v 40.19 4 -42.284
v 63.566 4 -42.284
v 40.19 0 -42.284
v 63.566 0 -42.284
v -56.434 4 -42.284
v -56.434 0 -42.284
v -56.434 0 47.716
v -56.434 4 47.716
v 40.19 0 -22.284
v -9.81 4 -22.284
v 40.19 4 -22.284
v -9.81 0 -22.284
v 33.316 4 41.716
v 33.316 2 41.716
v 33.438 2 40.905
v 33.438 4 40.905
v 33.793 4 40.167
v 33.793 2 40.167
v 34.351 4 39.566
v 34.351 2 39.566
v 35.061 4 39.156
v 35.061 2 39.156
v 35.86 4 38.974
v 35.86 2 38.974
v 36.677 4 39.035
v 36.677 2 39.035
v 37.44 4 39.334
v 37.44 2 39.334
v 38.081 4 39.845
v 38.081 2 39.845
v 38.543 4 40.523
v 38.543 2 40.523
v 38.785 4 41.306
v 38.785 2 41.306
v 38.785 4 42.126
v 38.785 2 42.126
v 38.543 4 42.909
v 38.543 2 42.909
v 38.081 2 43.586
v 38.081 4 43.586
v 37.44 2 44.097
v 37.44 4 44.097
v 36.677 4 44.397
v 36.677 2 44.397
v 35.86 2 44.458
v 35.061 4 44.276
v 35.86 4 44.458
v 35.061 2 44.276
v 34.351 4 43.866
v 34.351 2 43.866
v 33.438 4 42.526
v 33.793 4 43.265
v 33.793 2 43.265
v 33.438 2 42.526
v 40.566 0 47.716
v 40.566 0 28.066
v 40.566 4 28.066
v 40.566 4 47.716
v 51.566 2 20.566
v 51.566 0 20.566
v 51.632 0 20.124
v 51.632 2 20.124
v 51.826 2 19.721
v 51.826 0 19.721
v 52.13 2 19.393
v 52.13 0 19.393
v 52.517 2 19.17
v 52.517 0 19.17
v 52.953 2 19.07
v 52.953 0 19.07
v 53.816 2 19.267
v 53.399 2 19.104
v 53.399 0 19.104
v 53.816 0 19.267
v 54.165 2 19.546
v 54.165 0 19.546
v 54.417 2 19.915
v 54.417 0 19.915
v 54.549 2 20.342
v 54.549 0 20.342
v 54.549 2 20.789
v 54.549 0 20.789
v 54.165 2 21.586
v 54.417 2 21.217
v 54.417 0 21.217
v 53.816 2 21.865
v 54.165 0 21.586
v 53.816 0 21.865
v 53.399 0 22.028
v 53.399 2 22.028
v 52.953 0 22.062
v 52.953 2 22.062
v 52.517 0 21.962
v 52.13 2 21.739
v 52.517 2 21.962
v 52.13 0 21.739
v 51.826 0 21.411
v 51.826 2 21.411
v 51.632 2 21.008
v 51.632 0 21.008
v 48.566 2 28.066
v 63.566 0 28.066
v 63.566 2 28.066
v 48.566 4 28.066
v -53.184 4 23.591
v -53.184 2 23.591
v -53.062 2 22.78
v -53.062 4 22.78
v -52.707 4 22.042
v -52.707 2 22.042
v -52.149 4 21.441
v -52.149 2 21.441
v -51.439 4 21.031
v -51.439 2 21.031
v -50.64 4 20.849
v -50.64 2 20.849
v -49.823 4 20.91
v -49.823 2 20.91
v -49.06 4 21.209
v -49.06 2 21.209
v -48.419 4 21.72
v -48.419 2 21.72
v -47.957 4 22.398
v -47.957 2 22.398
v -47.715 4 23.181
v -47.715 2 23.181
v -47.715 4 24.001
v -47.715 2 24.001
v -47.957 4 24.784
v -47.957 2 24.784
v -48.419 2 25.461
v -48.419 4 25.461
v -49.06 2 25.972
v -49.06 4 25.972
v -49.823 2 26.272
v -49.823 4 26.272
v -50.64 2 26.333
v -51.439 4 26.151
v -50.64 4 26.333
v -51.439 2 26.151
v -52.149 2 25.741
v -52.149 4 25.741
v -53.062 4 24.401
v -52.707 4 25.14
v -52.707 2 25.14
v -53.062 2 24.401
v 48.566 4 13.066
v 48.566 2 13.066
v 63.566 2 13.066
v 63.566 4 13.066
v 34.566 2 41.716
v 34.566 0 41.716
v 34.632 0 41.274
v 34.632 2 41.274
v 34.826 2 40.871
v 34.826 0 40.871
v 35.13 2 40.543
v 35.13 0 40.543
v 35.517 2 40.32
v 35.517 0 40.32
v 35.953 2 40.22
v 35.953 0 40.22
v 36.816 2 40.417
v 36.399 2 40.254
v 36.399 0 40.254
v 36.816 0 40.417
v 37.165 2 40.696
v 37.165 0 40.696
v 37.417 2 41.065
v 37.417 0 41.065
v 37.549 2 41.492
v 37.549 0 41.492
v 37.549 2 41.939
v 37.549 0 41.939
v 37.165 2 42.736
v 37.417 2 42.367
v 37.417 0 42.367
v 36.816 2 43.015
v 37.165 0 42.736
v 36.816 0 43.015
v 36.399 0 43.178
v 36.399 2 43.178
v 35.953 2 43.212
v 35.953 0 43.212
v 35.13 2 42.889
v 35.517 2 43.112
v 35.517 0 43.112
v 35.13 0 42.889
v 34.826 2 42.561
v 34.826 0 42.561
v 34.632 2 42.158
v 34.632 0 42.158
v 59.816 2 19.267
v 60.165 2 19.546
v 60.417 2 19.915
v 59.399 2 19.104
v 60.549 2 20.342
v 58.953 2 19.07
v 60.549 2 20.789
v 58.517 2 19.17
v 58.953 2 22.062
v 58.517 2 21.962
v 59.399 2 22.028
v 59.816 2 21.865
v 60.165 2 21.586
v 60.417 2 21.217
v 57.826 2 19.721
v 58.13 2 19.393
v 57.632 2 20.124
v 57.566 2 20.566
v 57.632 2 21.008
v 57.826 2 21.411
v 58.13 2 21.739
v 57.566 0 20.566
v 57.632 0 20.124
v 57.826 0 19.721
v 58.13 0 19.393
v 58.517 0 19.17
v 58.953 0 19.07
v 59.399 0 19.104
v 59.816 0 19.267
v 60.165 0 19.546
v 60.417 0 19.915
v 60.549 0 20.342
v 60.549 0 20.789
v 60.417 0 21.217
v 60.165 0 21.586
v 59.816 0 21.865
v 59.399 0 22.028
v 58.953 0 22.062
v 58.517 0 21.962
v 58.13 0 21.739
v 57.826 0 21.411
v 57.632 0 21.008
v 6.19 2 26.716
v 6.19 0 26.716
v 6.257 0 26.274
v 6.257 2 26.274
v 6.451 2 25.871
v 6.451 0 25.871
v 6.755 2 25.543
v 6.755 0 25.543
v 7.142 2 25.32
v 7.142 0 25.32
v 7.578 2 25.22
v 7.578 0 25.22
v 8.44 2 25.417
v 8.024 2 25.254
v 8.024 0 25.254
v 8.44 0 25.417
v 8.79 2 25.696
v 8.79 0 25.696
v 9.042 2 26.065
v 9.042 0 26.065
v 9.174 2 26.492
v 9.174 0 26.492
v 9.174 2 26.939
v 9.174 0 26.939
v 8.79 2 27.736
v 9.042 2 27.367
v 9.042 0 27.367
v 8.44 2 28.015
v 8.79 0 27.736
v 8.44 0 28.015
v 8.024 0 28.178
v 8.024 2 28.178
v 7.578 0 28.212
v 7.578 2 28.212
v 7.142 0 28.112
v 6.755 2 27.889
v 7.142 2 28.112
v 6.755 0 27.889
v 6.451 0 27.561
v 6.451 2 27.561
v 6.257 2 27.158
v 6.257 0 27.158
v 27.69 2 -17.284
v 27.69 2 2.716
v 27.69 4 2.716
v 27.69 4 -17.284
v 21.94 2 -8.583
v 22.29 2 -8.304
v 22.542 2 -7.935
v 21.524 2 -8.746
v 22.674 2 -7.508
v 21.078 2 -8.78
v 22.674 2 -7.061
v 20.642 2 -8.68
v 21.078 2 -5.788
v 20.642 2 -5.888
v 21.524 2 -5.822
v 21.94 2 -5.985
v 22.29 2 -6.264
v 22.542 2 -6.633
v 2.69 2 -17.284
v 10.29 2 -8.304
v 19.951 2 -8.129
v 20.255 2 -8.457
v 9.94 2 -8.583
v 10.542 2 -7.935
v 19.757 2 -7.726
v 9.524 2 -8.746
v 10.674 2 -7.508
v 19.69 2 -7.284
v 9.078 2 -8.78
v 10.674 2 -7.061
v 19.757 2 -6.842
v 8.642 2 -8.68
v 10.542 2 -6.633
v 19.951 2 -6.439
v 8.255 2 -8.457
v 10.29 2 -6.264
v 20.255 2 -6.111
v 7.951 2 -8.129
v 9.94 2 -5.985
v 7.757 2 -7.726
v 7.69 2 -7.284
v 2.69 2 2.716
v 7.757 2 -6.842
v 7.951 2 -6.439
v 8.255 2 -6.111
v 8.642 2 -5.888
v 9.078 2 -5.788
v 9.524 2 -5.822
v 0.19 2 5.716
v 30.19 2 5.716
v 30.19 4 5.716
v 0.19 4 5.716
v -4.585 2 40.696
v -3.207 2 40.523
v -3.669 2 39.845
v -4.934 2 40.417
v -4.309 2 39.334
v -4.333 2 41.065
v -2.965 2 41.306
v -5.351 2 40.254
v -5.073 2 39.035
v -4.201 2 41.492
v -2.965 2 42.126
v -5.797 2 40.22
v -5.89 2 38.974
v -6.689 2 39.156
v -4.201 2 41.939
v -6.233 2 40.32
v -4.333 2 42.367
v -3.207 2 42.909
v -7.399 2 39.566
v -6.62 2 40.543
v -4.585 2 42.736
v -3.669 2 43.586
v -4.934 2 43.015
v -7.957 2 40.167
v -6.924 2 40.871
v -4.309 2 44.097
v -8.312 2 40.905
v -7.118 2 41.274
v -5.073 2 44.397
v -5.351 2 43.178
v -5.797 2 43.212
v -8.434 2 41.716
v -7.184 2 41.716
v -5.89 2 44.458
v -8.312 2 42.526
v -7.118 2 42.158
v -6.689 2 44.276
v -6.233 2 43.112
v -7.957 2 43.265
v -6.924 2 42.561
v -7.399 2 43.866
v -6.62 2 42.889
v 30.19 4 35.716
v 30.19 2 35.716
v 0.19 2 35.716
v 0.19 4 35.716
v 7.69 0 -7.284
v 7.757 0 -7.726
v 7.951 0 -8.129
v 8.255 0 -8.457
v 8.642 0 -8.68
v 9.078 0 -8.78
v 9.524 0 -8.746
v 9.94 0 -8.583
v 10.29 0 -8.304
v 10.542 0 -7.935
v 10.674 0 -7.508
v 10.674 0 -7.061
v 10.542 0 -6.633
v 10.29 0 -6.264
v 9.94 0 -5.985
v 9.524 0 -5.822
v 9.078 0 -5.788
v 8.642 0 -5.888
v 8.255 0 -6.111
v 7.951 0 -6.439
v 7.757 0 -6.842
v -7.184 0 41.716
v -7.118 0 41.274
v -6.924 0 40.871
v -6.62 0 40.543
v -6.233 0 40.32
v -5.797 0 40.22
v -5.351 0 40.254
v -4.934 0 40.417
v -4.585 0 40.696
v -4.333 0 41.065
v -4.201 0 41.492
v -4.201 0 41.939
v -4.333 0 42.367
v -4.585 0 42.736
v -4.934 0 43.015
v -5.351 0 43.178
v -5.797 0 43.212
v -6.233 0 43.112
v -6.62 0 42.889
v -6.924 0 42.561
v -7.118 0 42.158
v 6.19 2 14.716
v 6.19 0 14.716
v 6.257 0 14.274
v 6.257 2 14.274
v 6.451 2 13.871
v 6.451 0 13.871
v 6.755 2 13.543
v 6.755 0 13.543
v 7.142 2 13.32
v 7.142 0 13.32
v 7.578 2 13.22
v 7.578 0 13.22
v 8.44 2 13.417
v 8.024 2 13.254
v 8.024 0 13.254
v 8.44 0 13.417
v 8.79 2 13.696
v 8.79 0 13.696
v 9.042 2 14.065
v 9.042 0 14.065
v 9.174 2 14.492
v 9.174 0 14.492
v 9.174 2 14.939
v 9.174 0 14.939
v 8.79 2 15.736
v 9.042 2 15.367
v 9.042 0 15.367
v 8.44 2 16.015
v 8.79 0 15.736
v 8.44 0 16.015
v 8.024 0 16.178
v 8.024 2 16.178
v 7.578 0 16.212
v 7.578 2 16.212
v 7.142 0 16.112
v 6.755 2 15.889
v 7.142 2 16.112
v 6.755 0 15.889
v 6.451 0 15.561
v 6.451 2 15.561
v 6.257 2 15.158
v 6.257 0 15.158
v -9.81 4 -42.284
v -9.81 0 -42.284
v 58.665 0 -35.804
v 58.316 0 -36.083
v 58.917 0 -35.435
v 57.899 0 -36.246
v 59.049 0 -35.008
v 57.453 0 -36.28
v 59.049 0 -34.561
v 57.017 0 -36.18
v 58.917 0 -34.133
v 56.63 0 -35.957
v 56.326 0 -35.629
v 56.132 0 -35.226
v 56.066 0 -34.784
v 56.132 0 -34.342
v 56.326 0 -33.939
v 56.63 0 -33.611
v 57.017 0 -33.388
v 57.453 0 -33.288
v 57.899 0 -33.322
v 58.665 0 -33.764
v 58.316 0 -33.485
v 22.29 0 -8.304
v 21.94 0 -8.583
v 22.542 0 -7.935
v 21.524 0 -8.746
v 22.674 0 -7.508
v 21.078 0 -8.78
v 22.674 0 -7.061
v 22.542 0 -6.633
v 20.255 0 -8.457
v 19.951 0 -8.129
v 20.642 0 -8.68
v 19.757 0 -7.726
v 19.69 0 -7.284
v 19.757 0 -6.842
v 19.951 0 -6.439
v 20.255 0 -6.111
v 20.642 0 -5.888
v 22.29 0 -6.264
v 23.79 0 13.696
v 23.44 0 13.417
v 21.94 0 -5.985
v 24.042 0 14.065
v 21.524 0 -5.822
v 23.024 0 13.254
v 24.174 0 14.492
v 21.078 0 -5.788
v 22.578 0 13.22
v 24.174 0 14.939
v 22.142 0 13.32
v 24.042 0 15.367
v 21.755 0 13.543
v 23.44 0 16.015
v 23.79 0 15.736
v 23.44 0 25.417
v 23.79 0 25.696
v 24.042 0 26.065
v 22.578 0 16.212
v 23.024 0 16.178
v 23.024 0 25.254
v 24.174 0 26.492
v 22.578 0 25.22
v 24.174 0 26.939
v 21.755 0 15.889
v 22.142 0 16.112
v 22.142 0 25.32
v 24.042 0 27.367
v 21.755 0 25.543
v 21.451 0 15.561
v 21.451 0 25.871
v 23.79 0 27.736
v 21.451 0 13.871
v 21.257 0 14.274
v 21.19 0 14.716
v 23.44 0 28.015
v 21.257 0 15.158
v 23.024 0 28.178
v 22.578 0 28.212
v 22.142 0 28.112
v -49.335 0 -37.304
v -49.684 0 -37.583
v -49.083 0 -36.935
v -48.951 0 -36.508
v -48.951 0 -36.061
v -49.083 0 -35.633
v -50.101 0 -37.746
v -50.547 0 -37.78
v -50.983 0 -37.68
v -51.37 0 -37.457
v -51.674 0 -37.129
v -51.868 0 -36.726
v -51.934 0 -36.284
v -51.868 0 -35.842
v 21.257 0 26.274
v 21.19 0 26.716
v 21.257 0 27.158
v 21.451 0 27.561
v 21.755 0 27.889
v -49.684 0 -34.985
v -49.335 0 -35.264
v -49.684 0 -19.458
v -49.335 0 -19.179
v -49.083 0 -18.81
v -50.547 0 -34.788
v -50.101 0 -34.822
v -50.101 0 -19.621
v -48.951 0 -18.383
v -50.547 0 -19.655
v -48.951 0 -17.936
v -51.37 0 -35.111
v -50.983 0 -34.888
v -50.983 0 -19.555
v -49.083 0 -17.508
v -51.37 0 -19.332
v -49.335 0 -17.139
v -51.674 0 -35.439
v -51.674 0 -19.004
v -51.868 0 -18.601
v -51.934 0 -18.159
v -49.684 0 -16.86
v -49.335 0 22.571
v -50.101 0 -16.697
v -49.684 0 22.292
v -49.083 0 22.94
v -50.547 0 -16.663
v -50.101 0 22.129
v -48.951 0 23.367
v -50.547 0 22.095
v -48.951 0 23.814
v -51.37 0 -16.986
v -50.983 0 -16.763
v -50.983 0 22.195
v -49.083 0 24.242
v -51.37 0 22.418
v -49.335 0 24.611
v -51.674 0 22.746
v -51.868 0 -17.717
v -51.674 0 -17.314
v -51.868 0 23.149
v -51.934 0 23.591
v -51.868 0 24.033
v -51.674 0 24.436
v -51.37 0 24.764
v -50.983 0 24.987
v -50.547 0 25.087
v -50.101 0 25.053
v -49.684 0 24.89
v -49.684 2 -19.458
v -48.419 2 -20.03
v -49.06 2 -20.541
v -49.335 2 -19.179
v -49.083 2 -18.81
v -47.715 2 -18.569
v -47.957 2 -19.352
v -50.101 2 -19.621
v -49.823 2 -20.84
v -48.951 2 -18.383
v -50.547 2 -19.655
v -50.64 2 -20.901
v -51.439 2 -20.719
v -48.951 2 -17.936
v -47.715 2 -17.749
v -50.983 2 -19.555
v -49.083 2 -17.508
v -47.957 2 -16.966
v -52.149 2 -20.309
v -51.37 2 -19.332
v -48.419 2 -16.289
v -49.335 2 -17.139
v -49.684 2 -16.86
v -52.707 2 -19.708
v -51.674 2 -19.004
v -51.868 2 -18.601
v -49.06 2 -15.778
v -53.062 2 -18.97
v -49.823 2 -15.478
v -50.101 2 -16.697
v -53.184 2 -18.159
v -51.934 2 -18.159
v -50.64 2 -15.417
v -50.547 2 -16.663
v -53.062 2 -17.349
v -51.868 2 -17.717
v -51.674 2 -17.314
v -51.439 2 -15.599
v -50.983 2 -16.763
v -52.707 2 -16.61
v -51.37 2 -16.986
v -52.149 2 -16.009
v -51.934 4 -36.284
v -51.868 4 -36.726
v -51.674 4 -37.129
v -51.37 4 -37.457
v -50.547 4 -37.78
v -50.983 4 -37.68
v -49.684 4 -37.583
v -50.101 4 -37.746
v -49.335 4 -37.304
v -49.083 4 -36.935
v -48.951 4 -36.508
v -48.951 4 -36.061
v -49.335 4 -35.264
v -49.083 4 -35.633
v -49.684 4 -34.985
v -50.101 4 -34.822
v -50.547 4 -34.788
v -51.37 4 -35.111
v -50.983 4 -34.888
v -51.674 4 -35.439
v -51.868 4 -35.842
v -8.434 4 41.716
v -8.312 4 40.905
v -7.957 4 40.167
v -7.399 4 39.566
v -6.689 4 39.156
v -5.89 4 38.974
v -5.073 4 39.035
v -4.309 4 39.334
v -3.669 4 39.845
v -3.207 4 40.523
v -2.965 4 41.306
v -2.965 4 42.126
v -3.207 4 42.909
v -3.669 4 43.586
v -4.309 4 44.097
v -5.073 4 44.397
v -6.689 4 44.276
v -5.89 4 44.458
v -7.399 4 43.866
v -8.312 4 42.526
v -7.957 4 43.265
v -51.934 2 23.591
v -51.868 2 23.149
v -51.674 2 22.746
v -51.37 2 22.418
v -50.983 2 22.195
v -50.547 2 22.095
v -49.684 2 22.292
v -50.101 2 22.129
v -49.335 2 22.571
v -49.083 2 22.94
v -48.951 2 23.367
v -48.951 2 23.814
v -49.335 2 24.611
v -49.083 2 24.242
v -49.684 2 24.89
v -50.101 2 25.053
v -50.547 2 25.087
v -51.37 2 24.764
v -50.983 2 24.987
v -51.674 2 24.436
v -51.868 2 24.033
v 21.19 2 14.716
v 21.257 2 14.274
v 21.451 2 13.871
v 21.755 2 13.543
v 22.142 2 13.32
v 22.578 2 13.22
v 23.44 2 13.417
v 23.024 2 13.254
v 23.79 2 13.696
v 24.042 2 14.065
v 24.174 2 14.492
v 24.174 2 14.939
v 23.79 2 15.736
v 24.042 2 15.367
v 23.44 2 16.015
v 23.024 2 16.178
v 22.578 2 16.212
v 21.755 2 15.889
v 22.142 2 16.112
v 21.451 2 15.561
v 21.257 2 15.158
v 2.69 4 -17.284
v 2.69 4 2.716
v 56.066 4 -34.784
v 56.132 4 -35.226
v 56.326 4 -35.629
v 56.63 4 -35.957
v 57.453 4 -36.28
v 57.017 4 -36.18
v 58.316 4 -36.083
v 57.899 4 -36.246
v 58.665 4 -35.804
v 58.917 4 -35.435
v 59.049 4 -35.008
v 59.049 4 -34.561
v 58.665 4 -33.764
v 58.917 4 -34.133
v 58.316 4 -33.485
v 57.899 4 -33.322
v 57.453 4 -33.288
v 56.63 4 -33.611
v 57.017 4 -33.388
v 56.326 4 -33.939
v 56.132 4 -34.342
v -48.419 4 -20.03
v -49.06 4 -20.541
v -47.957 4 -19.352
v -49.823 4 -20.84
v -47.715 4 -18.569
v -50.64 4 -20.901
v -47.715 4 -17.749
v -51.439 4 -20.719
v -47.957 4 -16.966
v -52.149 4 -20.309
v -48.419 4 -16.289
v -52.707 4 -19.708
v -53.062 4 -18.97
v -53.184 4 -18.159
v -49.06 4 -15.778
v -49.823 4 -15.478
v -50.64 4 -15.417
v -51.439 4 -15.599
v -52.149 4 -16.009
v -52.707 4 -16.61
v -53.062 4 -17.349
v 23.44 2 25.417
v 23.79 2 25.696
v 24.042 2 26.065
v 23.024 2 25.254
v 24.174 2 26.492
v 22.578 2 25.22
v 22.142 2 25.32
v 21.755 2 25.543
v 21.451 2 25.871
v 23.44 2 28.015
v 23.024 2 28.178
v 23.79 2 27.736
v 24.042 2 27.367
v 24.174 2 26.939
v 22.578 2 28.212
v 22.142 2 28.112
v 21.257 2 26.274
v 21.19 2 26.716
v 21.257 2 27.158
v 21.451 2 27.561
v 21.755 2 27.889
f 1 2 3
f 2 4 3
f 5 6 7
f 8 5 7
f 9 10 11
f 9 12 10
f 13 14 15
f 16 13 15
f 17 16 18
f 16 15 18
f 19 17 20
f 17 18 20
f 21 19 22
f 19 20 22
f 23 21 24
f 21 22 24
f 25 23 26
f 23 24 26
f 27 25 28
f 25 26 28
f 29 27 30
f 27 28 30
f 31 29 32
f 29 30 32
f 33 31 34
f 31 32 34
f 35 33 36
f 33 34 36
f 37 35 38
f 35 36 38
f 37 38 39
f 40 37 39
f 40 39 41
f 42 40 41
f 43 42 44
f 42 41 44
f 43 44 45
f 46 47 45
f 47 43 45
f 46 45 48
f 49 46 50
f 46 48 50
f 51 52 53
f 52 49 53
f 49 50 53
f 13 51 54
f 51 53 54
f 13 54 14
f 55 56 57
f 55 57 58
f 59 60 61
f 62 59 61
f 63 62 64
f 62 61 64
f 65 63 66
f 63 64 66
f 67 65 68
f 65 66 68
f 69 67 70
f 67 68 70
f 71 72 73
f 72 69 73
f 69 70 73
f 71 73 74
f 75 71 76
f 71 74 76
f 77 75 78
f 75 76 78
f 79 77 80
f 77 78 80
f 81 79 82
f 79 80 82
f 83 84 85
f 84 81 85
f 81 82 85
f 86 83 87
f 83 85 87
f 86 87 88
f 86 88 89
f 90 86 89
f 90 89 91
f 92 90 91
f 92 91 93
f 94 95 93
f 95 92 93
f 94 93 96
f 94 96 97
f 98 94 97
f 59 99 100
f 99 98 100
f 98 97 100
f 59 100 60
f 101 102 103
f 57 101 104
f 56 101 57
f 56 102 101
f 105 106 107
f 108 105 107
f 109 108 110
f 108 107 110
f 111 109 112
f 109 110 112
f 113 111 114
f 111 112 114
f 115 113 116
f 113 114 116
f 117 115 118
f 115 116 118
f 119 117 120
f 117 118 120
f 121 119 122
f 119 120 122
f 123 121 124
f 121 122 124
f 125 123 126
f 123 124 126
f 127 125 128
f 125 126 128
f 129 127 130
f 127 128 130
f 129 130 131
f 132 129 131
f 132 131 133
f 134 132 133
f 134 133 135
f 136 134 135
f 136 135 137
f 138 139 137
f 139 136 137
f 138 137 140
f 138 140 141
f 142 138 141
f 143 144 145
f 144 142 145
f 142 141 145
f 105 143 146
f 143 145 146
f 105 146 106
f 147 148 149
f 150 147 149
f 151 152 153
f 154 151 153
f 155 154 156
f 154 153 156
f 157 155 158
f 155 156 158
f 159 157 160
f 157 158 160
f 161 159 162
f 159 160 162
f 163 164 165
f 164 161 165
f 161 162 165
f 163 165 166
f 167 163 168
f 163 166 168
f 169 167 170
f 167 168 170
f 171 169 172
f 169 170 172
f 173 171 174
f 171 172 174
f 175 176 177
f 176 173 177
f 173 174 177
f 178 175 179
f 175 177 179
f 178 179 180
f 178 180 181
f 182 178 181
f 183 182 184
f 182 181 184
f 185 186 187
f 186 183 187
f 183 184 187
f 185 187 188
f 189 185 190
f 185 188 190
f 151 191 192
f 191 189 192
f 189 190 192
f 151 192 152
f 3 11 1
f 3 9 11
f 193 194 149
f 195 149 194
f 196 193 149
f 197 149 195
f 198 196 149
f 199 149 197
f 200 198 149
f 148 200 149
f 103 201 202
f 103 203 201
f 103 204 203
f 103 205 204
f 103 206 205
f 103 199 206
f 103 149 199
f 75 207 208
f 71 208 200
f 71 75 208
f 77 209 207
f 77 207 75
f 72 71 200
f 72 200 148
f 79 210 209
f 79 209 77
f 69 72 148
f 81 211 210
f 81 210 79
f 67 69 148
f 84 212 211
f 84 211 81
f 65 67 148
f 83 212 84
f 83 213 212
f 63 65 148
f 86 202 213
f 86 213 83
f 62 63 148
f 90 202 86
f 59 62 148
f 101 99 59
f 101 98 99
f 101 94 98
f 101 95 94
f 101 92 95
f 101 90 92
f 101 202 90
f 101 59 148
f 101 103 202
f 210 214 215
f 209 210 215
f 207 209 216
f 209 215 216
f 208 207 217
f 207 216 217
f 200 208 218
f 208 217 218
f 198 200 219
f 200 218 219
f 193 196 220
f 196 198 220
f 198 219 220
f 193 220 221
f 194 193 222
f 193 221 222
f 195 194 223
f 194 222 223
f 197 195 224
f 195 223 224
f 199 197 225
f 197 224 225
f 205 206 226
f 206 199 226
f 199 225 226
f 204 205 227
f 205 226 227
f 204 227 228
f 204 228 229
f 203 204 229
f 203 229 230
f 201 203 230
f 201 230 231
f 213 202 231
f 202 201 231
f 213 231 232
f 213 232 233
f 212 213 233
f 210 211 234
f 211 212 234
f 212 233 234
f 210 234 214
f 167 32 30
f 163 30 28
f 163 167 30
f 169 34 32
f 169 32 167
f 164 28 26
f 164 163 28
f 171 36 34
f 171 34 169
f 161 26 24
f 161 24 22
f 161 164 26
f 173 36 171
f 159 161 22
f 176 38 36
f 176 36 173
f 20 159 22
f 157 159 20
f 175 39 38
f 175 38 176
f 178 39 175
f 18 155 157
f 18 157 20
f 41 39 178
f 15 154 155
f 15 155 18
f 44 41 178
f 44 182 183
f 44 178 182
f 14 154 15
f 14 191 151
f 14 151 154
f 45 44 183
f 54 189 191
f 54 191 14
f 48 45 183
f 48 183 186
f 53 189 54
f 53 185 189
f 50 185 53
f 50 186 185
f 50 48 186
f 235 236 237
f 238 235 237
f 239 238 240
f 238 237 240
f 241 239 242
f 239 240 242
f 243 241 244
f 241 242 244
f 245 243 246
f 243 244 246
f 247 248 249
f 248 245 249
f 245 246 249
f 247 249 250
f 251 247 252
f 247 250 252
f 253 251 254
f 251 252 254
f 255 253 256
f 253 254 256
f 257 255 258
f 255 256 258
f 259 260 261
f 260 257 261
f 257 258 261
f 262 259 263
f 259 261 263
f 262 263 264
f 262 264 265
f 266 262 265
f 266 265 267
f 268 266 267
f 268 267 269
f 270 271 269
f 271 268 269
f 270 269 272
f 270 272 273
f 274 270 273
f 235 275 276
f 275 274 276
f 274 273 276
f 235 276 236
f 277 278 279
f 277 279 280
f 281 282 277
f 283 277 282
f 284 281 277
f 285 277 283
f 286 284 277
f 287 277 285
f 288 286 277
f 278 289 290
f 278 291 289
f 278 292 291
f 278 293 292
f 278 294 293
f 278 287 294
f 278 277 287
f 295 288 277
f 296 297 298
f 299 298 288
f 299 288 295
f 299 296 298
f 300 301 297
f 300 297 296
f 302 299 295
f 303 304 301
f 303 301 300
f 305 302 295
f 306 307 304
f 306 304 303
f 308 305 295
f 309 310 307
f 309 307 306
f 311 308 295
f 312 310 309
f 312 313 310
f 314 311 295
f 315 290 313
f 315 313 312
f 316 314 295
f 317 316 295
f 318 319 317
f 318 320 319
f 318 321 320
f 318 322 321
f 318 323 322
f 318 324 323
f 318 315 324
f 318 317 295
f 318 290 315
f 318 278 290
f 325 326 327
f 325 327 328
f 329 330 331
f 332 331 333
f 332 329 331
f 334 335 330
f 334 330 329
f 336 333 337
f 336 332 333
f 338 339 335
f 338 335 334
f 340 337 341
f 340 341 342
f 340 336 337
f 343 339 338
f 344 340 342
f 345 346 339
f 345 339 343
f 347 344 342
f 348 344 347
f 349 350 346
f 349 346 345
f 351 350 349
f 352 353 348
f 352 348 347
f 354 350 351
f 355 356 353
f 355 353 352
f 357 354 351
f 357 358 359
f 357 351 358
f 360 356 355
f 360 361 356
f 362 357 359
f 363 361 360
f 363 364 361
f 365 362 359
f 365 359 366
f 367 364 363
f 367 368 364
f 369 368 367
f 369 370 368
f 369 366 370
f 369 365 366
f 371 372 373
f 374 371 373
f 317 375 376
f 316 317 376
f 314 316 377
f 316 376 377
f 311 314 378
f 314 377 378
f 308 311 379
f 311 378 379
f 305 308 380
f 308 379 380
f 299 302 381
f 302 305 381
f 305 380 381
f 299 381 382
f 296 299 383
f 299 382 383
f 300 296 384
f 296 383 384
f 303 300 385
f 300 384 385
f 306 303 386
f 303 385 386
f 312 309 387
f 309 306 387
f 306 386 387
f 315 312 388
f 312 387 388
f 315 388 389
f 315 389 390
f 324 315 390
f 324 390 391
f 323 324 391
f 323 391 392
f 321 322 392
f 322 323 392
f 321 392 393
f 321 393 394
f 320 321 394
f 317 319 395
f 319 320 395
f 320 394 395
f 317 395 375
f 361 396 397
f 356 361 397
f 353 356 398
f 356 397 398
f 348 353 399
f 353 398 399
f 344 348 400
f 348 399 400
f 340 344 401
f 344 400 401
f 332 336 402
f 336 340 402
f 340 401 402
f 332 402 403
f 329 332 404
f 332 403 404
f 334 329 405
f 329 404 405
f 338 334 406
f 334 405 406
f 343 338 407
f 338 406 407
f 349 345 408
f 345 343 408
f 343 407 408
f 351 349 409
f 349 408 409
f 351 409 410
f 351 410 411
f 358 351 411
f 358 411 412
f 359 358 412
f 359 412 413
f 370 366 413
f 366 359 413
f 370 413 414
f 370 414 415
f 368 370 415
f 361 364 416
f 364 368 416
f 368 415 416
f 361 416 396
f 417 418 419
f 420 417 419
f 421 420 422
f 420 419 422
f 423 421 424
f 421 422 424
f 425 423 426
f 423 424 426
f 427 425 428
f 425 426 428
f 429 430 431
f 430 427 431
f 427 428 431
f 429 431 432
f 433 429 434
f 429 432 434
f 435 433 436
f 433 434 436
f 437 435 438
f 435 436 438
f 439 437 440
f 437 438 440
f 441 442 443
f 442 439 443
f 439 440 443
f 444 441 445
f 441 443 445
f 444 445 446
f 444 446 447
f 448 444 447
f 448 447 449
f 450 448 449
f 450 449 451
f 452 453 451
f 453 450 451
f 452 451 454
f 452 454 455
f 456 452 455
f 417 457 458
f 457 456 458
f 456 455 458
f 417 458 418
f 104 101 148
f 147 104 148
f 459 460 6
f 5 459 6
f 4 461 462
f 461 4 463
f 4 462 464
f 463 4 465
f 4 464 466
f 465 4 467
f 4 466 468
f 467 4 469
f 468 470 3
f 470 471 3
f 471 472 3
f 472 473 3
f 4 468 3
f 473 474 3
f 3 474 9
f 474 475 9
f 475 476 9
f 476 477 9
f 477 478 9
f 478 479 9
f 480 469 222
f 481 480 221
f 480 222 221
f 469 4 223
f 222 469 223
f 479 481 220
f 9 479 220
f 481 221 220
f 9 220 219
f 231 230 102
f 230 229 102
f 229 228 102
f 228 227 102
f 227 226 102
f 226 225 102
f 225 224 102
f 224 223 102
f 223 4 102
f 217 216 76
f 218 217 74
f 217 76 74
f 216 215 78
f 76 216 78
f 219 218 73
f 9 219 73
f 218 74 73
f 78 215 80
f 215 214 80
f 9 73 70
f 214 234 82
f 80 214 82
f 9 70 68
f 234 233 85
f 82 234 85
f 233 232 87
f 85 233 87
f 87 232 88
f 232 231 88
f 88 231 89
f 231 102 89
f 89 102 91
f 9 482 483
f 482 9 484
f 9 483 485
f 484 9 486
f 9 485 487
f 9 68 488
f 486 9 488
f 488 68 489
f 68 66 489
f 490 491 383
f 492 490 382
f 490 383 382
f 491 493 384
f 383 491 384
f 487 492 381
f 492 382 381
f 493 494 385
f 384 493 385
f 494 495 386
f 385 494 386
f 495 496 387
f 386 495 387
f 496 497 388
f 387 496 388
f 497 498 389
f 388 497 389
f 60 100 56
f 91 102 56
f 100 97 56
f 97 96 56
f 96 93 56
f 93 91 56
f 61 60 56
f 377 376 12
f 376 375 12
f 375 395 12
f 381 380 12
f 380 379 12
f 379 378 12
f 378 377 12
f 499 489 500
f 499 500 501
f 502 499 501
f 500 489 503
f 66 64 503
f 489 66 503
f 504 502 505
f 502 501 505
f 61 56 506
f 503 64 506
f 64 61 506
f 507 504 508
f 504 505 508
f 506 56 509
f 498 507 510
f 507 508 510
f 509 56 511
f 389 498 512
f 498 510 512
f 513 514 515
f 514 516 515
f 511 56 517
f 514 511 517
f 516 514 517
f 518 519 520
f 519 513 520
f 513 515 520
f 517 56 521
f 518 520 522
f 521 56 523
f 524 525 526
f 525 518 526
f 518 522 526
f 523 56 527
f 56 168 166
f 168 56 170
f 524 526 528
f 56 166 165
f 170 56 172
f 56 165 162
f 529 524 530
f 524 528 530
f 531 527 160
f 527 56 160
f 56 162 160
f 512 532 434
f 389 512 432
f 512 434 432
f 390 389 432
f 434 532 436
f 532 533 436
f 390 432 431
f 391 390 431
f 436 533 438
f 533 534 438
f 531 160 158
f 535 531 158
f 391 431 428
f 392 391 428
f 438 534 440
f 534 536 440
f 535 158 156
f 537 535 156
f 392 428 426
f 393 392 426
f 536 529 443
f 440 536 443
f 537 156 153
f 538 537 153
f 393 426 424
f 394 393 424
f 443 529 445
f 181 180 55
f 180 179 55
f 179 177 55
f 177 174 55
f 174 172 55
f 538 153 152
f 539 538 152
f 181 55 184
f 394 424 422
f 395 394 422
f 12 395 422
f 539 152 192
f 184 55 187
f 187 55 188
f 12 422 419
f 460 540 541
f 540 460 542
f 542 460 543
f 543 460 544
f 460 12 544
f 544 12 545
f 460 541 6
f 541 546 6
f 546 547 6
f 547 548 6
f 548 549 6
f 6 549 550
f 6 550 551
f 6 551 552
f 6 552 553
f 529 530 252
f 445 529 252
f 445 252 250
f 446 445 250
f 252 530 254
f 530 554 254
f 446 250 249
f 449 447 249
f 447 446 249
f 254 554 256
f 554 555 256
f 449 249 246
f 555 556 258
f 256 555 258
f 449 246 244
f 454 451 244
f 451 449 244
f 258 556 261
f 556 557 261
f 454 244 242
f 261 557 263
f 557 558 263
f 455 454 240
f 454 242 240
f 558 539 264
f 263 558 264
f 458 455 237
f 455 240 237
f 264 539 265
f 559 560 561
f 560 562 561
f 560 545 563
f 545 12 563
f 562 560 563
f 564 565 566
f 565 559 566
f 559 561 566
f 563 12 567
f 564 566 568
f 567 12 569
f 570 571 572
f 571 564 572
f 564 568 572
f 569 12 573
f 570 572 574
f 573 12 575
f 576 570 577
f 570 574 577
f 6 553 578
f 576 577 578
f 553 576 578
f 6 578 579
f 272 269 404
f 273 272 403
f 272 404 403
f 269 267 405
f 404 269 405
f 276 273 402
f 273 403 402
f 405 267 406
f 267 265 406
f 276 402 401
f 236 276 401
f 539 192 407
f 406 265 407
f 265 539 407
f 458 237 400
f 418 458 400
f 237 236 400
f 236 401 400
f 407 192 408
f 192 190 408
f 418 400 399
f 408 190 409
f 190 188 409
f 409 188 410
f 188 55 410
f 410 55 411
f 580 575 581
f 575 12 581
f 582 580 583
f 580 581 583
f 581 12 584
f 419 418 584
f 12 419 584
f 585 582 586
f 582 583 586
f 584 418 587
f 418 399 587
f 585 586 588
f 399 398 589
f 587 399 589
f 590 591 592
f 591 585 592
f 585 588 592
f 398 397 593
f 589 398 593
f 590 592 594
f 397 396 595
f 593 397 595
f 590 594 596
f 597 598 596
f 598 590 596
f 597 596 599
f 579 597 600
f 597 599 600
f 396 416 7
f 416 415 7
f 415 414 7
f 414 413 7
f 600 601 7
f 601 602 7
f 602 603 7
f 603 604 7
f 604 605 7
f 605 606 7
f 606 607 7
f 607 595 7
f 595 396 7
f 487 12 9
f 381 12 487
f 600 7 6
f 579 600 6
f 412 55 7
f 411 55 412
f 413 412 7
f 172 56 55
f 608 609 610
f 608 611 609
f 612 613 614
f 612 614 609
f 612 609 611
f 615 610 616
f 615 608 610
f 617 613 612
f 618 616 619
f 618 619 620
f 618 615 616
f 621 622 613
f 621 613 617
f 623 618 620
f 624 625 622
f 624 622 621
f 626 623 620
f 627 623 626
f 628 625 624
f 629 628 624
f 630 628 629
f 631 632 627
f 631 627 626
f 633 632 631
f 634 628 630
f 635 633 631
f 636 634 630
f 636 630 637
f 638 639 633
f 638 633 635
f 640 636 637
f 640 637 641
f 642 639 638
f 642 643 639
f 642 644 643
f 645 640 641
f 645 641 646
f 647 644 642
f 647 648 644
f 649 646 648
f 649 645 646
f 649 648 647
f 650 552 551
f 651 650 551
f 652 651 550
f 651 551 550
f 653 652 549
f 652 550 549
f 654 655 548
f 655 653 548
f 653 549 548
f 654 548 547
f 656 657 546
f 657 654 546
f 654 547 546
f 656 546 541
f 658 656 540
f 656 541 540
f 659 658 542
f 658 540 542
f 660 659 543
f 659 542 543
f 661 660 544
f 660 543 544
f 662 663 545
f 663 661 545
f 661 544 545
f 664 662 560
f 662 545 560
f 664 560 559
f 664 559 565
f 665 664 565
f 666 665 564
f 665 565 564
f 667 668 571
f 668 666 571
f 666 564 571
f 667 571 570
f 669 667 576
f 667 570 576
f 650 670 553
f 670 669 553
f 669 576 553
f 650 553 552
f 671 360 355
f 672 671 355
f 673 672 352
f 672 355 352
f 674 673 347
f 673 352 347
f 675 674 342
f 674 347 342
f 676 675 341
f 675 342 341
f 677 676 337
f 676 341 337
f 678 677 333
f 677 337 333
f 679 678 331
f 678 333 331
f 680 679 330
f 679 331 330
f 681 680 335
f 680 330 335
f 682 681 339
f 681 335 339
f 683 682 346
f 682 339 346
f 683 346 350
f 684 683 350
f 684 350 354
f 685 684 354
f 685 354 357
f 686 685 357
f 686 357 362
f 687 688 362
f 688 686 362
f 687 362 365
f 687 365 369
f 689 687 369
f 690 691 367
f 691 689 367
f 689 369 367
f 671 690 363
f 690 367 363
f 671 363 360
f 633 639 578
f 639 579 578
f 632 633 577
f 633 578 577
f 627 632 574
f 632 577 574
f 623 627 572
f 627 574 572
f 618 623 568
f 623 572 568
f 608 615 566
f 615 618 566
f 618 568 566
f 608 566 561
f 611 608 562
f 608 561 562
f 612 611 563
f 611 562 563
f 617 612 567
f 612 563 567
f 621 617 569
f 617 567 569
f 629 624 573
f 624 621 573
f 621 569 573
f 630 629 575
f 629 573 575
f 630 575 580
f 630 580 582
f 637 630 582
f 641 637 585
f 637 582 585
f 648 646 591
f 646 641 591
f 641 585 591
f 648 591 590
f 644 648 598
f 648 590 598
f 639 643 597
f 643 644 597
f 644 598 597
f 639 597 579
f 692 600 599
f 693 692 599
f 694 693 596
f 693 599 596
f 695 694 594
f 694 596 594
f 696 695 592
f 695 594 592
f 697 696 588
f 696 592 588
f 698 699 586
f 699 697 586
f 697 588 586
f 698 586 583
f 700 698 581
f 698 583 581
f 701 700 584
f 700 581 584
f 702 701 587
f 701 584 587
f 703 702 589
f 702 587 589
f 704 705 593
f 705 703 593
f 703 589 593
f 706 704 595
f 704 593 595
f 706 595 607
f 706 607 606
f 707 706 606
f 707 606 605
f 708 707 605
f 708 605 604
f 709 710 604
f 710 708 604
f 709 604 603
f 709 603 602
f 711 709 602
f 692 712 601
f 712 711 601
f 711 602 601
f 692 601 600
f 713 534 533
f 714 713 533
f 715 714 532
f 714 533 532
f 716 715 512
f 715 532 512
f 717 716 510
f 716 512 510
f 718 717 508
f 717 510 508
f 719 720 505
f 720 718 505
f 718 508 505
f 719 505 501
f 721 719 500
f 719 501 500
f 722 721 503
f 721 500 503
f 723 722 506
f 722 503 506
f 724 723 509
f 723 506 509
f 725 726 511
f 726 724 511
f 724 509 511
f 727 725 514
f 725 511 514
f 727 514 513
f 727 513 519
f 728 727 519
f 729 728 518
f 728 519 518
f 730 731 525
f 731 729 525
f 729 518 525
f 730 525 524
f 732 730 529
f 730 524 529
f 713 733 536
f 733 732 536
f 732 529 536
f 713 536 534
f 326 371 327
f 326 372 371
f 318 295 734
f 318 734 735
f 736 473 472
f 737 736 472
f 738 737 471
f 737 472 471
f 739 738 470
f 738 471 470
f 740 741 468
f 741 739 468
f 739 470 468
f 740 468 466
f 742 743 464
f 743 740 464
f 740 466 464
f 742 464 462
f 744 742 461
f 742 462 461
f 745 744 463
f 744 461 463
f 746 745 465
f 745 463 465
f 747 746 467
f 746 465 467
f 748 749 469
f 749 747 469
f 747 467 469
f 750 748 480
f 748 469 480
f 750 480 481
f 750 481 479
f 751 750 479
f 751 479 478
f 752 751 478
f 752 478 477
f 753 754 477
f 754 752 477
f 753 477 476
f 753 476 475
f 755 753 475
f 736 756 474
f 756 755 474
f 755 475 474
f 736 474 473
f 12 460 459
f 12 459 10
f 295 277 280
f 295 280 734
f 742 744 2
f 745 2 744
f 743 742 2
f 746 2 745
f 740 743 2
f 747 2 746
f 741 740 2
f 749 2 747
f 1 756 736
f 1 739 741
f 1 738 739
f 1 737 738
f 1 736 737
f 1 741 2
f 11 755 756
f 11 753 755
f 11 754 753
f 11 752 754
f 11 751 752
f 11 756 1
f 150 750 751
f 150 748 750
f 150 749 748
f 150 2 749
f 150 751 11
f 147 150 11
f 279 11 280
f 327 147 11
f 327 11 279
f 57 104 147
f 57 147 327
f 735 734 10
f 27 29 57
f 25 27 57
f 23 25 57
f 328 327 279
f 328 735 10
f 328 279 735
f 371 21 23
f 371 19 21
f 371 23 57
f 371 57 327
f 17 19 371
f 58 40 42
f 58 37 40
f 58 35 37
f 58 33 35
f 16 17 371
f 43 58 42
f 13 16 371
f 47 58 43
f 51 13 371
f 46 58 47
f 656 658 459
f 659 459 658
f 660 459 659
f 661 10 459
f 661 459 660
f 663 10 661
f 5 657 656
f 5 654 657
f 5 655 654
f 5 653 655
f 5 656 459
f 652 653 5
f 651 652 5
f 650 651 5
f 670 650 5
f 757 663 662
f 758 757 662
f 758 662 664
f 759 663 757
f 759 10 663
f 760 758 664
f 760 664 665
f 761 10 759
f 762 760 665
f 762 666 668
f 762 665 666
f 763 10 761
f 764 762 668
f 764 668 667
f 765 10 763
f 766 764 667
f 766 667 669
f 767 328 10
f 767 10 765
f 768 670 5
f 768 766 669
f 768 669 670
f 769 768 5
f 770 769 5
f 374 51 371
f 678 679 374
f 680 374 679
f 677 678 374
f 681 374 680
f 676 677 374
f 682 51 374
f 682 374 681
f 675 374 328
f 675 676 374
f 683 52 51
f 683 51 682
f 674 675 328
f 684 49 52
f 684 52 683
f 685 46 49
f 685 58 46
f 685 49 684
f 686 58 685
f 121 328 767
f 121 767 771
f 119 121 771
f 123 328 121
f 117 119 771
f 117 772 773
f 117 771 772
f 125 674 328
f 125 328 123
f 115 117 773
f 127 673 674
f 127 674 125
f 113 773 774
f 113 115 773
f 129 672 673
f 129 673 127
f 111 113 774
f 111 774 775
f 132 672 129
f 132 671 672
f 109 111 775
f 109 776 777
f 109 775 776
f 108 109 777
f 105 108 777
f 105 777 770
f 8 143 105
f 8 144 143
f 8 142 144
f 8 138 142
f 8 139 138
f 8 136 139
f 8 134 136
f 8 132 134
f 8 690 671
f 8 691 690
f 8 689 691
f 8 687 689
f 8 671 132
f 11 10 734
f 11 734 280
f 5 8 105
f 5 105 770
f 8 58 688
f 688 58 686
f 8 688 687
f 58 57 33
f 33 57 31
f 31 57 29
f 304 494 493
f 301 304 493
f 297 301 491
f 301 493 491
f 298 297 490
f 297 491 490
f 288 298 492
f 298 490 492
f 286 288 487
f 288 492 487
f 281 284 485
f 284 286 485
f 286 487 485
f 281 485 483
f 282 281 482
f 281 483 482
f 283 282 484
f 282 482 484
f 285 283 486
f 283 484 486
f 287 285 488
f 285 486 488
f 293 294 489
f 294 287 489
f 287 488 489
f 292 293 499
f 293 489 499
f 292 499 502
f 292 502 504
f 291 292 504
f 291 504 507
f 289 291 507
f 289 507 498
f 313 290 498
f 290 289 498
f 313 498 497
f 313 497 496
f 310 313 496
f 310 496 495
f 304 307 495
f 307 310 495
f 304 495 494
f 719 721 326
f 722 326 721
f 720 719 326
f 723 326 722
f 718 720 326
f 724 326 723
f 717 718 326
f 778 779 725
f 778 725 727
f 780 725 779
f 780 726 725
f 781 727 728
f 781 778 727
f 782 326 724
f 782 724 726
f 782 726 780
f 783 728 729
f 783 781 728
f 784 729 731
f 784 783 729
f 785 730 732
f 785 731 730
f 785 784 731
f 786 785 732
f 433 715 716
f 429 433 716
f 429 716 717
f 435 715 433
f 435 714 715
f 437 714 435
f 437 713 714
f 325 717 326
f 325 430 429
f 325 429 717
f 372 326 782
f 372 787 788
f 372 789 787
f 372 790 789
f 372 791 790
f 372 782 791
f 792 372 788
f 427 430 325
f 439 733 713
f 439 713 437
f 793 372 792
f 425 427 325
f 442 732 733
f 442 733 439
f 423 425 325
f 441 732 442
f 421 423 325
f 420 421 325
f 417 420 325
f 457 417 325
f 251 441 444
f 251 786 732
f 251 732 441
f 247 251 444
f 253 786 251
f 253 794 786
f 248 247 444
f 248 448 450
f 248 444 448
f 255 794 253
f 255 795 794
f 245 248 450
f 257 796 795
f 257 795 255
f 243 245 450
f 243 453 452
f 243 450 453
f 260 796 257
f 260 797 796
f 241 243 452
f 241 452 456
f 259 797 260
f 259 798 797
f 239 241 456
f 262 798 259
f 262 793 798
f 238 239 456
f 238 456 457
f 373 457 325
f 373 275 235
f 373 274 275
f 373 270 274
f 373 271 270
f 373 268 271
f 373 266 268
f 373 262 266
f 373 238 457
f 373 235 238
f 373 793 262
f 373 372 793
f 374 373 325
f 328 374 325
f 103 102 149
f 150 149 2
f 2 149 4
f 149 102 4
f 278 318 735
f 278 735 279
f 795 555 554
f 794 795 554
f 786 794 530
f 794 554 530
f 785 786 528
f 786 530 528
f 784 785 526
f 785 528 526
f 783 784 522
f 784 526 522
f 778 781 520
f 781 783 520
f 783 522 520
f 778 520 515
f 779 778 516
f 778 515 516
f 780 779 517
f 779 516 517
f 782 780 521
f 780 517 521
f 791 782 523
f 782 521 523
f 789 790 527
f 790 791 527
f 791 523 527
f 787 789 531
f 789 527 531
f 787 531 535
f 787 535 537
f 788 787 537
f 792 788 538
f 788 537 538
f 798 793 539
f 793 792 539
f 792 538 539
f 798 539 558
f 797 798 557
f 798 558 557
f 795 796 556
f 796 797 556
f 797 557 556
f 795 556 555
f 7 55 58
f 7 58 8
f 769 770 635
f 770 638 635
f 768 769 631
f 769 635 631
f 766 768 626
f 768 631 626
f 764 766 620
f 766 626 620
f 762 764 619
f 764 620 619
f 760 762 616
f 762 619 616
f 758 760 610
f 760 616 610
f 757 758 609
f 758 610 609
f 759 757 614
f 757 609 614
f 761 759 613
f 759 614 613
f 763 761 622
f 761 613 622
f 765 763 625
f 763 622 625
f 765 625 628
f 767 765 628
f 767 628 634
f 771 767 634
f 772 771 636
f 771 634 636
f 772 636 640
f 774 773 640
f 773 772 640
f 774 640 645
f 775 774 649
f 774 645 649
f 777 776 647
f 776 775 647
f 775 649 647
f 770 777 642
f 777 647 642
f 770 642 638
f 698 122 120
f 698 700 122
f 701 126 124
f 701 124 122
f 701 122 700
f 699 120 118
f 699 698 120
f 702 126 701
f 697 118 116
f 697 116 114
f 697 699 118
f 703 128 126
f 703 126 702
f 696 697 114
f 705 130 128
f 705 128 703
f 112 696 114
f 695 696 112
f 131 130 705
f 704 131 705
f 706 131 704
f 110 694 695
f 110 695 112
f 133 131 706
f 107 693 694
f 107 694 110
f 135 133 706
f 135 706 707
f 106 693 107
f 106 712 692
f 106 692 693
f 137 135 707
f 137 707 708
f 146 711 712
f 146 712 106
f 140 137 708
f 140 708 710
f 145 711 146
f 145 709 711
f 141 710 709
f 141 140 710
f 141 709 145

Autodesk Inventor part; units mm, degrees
ref_plane "YZ Plane" through (0, 0, 0) normal (1, 0, 0) x (0, 1, 0)
ref_plane "XZ Plane" through (0, 0, 0) normal (0, 1, 0) x (-1, 0, 0)
ref_plane "XY Plane" through (0, 0, 0) normal (0, 0, 1) x (1, 0, 0)
sketch "Sketch1" plane through (0, 0, 0) normal (0, 1, 0) x (-1, 0, 0)
  circle A0 centre (-7.6905, 26.7159) radius 1.5
  circle A1 centre (-7.6905, 14.7159) radius 1.5
  line L0 (-0.1905, 5.7159) -> (-15.1905, 5.7159)
  line L1 (-15.1905, 35.7159) -> (-0.1905, 35.7159)
  line L2 (-15.1905, 5.7159) -> (-15.1905, 35.7159)
  circle A2 centre (5.6845, 41.7159) radius 1.5
  circle A3 centre (5.6845, 41.7159) radius 2.75
  line L3 (-2.528, 47.7159) -> (7.472, 47.7159)
  circle A4 centre (50.4345, -18.1591) radius 2.75
  circle A5 centre (50.4345, -36.2841) radius 1.5
  line L4 (9.8095, -42.2841) -> (9.8095, -22.2841)
  circle A6 centre (50.4345, -18.1591) radius 1.5
  line L5 (-0.1905, 35.7159) -> (-0.1905, 5.7159)
  line L6 (56.4345, 47.7159) -> (7.472, 47.7159)
  circle A7 centre (50.4345, 23.5909) radius 1.5
  line L7 (56.4345, -42.2841) -> (56.4345, 47.7159)
  line L8 (42.1595, 2.7159) -> (61.2095, 2.7159) construction
  circle A8 centre (50.4345, 23.5909) radius 2.75
  line L9 (-15.1905, 35.7159) -> (-30.1905, 35.7159)
  line L10 (-63.5655, 30.7159) -> (-63.5655, 47.7159)
  line L11 (-63.5655, 47.7159) -> (-48.5655, 47.7159)
  line L12 (-2.528, 47.7159) -> (-63.5655, 47.7159)
  circle A9 centre (-36.0655, 41.7159) radius 1.5
  circle A10 centre (-36.0655, 41.7159) radius 2.75
  circle A11 centre (-21.1905, -7.2841) radius 1.5
  line L13 (-27.6905, 2.7159) -> (-27.6905, -17.2841)
  circle A12 centre (-57.5655, -34.7841) radius 1.5
  line L14 (-2.6905, 2.7159) -> (-27.6905, 2.7159)
  circle A13 centre (-9.1905, -7.2841) radius 1.5
  line L15 (-2.6905, -17.2841) -> (-2.6905, 2.7159)
  line L16 (-27.6905, -17.2841) -> (-2.6905, -17.2841)
  line L17 (-63.5655, 47.7159) -> (-63.5655, -42.2841)
  line L18 (9.8095, -22.2841) -> (-40.1905, -22.2841)
  line L19 (-40.1905, -22.2841) -> (-40.1905, -42.2841)
  line L20 (-40.1905, -42.2841) -> (9.8095, -42.2841)
  line L21 (-63.5655, -42.2841) -> (56.4345, -42.2841)
  line L22 (-63.5655, 28.0659) -> (-48.5655, 28.0659)
  circle A14 centre (-22.6905, 26.7159) radius 1.5
  circle A15 centre (-53.0655, 20.5659) radius 1.5
  circle A16 centre (-59.0655, 20.5659) radius 1.5
  circle A17 centre (-53.0655, 20.5659) radius 2.5
  circle A18 centre (-22.6905, 14.7159) radius 1.5
  line L23 (-15.1905, 5.7159) -> (-15.1905, 35.7159)
  line L24 (-30.1905, 5.7159) -> (-15.1905, 5.7159)
  line L25 (-48.5655, 28.0659) -> (-48.5655, 13.0659)
  line L26 (-30.1905, 35.7159) -> (-30.1905, 5.7159)
  circle A19 centre (-59.0655, 20.5659) radius 2.5
  line L27 (-48.5655, 13.0659) -> (-63.5655, 13.0659)
  line L28 (-63.5655, 13.0659) -> (-63.5655, 28.0659)
  line L29 (-15.1905, 2.7159) -> (-15.1905, 34.925) construction
  line L30 (-48.5655, 28.0659) -> (-40.5655, 28.0659)
  line L31 (-40.5655, 28.0659) -> (-40.5655, 47.7159)
  point P0 (0, 0)
  point P1 (5.1035, 21.0043)
  point P2 (5.6845, 35.7159)
  point P3 (2.472, 2.7159)
  point P4 (-36.0655, 35.7159)
  point P5 (-2.6905, -7.2841)
  point P6 (-43.5655, 47.7159)
  dimension "d4" = 12
  dimension "d5" = 7.5
  dimension "d6" = 12
  dimension "d7" = 9
  dimension "d8" = 0
  dimension "d10" = 0
  dimension "d12" = 8
  dimension "d13" = 5.5
  dimension "d14" = 5.5
  dimension "d15" = 5.5
  dimension "d16" = 5.5
extrude "Extrusion1" add sketch "Sketch1" along normal blind 4 contours L3 L6 L7 L21 L4 L18 L19 L17 L27 L25 L30 L31 L12
extrude "Extrusion2" add sketch "Sketch1" along normal blind 2 contours L0 L2 L1 L5 | L24 L26 L9 L2 | A3 | L25 L27 L17 L22 | A4 | A8 | A10 | L14 L15 L16 L13 | A17 | A19
properties part number "Casis Kanan Bawah_3DPrint"
